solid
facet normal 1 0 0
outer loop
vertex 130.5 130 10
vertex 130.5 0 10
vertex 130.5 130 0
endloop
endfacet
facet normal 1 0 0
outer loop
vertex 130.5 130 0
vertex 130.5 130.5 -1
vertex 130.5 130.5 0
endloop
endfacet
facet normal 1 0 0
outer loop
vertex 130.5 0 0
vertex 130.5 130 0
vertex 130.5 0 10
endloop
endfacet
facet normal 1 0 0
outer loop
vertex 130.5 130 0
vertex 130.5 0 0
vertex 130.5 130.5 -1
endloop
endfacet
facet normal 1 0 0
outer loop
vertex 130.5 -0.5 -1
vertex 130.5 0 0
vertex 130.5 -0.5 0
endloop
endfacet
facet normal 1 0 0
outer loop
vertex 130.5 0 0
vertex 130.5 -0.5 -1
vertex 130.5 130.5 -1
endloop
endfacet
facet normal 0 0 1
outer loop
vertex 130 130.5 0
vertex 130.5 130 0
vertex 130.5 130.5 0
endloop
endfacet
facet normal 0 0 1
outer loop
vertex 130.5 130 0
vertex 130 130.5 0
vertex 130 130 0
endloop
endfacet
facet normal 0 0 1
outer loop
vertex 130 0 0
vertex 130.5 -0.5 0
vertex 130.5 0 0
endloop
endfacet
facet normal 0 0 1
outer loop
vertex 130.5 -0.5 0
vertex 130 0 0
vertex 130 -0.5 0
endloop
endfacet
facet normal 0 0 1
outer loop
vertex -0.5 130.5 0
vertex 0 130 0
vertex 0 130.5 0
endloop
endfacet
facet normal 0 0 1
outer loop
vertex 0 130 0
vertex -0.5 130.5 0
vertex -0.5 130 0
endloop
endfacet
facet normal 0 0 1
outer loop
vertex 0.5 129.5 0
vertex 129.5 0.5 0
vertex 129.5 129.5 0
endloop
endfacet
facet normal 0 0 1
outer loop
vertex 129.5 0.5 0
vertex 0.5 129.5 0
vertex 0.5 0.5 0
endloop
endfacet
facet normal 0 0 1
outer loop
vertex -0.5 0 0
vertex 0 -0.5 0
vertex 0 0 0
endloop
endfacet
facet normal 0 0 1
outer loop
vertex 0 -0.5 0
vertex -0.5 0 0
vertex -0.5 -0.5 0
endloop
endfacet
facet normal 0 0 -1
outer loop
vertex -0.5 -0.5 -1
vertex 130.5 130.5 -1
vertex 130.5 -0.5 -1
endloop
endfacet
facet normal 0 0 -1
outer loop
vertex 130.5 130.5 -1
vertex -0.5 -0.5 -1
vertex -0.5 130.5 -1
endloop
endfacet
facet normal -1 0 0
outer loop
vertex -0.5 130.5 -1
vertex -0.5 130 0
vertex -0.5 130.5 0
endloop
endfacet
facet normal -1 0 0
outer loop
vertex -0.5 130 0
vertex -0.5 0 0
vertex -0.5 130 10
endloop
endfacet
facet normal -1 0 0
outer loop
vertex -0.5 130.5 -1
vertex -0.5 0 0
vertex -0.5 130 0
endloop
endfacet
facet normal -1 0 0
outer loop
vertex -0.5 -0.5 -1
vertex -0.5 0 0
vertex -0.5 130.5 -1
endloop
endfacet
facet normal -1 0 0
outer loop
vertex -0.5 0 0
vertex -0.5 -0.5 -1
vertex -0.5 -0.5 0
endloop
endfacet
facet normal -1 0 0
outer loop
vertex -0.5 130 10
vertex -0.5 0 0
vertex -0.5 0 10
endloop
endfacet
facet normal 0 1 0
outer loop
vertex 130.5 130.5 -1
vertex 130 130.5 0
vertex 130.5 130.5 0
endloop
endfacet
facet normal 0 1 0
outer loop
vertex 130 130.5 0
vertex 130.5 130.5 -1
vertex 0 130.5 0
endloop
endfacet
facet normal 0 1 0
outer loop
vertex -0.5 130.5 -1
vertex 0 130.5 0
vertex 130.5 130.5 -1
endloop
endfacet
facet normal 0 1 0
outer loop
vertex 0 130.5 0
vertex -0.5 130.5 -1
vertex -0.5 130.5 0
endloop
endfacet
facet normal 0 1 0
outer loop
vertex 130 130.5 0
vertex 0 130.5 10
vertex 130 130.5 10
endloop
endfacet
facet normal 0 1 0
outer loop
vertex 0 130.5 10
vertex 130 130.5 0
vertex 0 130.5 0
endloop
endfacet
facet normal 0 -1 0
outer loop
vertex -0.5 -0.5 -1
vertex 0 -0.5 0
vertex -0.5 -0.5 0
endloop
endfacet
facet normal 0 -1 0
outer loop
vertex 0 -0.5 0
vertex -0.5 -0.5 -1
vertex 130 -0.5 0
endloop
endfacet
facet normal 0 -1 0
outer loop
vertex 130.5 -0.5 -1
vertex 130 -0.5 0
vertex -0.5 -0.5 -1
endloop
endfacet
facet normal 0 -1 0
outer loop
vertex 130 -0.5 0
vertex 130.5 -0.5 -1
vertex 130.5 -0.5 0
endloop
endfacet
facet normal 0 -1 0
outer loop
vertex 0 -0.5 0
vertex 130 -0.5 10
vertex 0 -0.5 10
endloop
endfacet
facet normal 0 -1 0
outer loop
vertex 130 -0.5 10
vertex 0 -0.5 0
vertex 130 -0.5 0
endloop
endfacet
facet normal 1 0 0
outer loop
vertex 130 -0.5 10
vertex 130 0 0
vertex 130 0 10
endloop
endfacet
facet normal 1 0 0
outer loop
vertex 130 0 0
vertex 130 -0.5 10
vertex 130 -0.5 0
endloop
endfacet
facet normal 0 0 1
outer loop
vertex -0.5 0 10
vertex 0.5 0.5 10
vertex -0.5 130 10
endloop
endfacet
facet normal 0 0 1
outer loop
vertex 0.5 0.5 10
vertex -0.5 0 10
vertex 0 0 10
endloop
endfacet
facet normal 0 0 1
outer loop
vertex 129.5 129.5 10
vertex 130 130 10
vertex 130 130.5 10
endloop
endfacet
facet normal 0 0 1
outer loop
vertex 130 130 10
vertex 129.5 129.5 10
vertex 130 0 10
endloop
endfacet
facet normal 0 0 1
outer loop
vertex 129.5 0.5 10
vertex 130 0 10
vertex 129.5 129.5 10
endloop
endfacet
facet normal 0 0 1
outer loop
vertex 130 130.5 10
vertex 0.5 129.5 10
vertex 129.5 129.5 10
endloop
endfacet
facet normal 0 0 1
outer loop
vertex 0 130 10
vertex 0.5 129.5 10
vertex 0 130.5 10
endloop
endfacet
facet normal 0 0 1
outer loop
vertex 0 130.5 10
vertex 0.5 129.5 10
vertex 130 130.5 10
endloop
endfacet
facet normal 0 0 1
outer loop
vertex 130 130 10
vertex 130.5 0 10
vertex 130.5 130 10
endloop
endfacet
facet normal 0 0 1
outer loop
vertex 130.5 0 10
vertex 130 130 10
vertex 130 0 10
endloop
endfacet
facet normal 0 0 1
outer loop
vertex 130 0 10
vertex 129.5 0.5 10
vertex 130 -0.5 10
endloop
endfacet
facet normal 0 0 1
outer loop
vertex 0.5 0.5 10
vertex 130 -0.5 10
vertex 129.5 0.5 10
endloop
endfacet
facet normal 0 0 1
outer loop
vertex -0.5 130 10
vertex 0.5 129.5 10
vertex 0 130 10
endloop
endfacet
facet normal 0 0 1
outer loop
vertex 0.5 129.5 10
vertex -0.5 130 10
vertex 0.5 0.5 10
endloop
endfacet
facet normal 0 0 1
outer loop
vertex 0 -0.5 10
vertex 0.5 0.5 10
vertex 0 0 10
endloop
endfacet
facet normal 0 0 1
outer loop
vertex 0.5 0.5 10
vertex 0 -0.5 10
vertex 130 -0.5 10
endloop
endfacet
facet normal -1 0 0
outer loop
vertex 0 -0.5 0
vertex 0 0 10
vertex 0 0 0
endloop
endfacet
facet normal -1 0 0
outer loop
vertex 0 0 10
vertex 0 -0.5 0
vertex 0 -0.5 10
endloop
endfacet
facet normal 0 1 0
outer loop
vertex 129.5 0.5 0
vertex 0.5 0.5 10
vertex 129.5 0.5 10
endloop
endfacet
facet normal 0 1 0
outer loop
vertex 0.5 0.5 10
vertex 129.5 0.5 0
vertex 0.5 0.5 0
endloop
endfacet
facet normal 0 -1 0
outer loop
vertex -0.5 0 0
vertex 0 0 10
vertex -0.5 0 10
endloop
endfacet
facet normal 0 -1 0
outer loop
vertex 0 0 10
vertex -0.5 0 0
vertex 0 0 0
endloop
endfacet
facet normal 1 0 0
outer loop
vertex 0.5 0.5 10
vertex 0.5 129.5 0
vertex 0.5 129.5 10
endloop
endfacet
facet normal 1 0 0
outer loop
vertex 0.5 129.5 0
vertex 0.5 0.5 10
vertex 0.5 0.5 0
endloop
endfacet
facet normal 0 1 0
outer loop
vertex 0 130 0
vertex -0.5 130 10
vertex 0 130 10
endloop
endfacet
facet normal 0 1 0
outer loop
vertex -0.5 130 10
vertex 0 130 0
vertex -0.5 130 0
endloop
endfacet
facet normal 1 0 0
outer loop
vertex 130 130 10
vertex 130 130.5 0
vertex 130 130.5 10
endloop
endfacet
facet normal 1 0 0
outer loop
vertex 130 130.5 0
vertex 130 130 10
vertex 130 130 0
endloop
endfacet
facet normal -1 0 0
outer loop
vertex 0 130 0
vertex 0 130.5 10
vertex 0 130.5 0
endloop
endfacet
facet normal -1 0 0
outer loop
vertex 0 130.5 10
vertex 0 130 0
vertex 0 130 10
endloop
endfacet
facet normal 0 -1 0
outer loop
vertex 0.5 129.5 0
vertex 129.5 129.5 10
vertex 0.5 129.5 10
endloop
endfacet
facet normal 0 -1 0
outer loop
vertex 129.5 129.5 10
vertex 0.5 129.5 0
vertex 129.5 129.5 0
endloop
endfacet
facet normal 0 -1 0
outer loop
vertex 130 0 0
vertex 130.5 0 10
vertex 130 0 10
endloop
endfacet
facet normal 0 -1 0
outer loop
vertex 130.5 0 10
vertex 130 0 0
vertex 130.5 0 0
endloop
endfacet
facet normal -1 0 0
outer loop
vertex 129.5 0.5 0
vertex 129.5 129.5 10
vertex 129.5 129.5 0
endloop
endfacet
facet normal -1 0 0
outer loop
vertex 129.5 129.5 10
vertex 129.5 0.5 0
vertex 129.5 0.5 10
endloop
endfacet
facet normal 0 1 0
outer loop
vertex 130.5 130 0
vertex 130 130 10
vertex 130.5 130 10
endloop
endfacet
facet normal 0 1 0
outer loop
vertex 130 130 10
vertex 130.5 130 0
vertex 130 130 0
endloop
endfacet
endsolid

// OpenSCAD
cellsize = 10;
wallheight = 10;
wallthickness = 1;
length = 13; 
width = 13;

    translate([-0.5,-0.5,-1])
    cube([length * cellsize +1, width * cellsize + 1, 1]); 
    translate([65,0,5]){
       cube([130,1,10],center = true);}
       
    translate([0,65,5]){rotate([0,0,90]){
       cube([130,1,10],center = true);}
   }
   
   
   translate([65,130,5]){
       cube([130,1,10],center = true);}
       
    translate([130,65,5]){rotate([0,0,90]){
       cube([130,1,10],center = true);}
       }
    
